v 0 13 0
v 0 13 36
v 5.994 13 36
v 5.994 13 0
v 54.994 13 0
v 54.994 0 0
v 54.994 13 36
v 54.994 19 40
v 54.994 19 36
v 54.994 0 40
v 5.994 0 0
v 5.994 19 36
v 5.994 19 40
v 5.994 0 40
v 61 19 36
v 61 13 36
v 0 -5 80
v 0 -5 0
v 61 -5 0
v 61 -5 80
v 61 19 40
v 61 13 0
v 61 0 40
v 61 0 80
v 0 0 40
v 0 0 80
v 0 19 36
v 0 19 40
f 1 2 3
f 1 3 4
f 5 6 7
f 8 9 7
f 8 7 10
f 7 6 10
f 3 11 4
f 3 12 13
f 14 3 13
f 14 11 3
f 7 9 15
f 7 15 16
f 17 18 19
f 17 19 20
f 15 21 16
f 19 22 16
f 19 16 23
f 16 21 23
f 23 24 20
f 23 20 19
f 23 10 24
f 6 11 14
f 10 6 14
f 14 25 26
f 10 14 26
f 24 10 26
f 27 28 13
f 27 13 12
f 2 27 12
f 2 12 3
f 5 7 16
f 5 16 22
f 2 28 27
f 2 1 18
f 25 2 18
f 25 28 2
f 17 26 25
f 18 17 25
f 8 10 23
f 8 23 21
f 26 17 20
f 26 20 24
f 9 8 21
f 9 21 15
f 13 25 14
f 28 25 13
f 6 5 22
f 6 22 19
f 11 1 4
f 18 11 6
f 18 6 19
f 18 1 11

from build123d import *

# Parameters (mm, degrees)
SKETCH_W     = 5
SKETCH_H     = 80
PAD_DEPTH    = 61
PAD001_DEPTH = 61
SKETCH002_W  = 49
SKETCH002_H  = 101.034886
POCKET_DEPTH = 19


with BuildPart() as part:
    # Sketch (on YZ_Plane of Origin) → Pad (new body)
    with BuildSketch(Plane.YZ):
        with Locations((-2.5, 40)):
            Rectangle(SKETCH_W, SKETCH_H)
    extrude(amount=PAD_DEPTH)

    # Sketch001 (on Face5 of Pad) → Pad001 (join)
    with BuildSketch(Plane(origin=(0, 0, 0), x_dir=(0, -1, 0), z_dir=(-1, 0, 0))):
        Polygon((0, 0), (0, 36), (0, 40), (-19, 40), (-19, 36), (-13, 36), (-13, 0), align=None)
    extrude(amount=-PAD001_DEPTH)

    # Sketch002 (on Face1 of Pad001) → Pocket (cut)
    with BuildSketch(Plane(origin=(0, 0, 0), x_dir=(-1, 0, 0), z_dir=(0, 1, 0))):
        with Locations((-30.493867, 45)):
            Rectangle(SKETCH002_W, SKETCH002_H)
    extrude(amount=POCKET_DEPTH, mode=Mode.SUBTRACT)


solid = part.part
